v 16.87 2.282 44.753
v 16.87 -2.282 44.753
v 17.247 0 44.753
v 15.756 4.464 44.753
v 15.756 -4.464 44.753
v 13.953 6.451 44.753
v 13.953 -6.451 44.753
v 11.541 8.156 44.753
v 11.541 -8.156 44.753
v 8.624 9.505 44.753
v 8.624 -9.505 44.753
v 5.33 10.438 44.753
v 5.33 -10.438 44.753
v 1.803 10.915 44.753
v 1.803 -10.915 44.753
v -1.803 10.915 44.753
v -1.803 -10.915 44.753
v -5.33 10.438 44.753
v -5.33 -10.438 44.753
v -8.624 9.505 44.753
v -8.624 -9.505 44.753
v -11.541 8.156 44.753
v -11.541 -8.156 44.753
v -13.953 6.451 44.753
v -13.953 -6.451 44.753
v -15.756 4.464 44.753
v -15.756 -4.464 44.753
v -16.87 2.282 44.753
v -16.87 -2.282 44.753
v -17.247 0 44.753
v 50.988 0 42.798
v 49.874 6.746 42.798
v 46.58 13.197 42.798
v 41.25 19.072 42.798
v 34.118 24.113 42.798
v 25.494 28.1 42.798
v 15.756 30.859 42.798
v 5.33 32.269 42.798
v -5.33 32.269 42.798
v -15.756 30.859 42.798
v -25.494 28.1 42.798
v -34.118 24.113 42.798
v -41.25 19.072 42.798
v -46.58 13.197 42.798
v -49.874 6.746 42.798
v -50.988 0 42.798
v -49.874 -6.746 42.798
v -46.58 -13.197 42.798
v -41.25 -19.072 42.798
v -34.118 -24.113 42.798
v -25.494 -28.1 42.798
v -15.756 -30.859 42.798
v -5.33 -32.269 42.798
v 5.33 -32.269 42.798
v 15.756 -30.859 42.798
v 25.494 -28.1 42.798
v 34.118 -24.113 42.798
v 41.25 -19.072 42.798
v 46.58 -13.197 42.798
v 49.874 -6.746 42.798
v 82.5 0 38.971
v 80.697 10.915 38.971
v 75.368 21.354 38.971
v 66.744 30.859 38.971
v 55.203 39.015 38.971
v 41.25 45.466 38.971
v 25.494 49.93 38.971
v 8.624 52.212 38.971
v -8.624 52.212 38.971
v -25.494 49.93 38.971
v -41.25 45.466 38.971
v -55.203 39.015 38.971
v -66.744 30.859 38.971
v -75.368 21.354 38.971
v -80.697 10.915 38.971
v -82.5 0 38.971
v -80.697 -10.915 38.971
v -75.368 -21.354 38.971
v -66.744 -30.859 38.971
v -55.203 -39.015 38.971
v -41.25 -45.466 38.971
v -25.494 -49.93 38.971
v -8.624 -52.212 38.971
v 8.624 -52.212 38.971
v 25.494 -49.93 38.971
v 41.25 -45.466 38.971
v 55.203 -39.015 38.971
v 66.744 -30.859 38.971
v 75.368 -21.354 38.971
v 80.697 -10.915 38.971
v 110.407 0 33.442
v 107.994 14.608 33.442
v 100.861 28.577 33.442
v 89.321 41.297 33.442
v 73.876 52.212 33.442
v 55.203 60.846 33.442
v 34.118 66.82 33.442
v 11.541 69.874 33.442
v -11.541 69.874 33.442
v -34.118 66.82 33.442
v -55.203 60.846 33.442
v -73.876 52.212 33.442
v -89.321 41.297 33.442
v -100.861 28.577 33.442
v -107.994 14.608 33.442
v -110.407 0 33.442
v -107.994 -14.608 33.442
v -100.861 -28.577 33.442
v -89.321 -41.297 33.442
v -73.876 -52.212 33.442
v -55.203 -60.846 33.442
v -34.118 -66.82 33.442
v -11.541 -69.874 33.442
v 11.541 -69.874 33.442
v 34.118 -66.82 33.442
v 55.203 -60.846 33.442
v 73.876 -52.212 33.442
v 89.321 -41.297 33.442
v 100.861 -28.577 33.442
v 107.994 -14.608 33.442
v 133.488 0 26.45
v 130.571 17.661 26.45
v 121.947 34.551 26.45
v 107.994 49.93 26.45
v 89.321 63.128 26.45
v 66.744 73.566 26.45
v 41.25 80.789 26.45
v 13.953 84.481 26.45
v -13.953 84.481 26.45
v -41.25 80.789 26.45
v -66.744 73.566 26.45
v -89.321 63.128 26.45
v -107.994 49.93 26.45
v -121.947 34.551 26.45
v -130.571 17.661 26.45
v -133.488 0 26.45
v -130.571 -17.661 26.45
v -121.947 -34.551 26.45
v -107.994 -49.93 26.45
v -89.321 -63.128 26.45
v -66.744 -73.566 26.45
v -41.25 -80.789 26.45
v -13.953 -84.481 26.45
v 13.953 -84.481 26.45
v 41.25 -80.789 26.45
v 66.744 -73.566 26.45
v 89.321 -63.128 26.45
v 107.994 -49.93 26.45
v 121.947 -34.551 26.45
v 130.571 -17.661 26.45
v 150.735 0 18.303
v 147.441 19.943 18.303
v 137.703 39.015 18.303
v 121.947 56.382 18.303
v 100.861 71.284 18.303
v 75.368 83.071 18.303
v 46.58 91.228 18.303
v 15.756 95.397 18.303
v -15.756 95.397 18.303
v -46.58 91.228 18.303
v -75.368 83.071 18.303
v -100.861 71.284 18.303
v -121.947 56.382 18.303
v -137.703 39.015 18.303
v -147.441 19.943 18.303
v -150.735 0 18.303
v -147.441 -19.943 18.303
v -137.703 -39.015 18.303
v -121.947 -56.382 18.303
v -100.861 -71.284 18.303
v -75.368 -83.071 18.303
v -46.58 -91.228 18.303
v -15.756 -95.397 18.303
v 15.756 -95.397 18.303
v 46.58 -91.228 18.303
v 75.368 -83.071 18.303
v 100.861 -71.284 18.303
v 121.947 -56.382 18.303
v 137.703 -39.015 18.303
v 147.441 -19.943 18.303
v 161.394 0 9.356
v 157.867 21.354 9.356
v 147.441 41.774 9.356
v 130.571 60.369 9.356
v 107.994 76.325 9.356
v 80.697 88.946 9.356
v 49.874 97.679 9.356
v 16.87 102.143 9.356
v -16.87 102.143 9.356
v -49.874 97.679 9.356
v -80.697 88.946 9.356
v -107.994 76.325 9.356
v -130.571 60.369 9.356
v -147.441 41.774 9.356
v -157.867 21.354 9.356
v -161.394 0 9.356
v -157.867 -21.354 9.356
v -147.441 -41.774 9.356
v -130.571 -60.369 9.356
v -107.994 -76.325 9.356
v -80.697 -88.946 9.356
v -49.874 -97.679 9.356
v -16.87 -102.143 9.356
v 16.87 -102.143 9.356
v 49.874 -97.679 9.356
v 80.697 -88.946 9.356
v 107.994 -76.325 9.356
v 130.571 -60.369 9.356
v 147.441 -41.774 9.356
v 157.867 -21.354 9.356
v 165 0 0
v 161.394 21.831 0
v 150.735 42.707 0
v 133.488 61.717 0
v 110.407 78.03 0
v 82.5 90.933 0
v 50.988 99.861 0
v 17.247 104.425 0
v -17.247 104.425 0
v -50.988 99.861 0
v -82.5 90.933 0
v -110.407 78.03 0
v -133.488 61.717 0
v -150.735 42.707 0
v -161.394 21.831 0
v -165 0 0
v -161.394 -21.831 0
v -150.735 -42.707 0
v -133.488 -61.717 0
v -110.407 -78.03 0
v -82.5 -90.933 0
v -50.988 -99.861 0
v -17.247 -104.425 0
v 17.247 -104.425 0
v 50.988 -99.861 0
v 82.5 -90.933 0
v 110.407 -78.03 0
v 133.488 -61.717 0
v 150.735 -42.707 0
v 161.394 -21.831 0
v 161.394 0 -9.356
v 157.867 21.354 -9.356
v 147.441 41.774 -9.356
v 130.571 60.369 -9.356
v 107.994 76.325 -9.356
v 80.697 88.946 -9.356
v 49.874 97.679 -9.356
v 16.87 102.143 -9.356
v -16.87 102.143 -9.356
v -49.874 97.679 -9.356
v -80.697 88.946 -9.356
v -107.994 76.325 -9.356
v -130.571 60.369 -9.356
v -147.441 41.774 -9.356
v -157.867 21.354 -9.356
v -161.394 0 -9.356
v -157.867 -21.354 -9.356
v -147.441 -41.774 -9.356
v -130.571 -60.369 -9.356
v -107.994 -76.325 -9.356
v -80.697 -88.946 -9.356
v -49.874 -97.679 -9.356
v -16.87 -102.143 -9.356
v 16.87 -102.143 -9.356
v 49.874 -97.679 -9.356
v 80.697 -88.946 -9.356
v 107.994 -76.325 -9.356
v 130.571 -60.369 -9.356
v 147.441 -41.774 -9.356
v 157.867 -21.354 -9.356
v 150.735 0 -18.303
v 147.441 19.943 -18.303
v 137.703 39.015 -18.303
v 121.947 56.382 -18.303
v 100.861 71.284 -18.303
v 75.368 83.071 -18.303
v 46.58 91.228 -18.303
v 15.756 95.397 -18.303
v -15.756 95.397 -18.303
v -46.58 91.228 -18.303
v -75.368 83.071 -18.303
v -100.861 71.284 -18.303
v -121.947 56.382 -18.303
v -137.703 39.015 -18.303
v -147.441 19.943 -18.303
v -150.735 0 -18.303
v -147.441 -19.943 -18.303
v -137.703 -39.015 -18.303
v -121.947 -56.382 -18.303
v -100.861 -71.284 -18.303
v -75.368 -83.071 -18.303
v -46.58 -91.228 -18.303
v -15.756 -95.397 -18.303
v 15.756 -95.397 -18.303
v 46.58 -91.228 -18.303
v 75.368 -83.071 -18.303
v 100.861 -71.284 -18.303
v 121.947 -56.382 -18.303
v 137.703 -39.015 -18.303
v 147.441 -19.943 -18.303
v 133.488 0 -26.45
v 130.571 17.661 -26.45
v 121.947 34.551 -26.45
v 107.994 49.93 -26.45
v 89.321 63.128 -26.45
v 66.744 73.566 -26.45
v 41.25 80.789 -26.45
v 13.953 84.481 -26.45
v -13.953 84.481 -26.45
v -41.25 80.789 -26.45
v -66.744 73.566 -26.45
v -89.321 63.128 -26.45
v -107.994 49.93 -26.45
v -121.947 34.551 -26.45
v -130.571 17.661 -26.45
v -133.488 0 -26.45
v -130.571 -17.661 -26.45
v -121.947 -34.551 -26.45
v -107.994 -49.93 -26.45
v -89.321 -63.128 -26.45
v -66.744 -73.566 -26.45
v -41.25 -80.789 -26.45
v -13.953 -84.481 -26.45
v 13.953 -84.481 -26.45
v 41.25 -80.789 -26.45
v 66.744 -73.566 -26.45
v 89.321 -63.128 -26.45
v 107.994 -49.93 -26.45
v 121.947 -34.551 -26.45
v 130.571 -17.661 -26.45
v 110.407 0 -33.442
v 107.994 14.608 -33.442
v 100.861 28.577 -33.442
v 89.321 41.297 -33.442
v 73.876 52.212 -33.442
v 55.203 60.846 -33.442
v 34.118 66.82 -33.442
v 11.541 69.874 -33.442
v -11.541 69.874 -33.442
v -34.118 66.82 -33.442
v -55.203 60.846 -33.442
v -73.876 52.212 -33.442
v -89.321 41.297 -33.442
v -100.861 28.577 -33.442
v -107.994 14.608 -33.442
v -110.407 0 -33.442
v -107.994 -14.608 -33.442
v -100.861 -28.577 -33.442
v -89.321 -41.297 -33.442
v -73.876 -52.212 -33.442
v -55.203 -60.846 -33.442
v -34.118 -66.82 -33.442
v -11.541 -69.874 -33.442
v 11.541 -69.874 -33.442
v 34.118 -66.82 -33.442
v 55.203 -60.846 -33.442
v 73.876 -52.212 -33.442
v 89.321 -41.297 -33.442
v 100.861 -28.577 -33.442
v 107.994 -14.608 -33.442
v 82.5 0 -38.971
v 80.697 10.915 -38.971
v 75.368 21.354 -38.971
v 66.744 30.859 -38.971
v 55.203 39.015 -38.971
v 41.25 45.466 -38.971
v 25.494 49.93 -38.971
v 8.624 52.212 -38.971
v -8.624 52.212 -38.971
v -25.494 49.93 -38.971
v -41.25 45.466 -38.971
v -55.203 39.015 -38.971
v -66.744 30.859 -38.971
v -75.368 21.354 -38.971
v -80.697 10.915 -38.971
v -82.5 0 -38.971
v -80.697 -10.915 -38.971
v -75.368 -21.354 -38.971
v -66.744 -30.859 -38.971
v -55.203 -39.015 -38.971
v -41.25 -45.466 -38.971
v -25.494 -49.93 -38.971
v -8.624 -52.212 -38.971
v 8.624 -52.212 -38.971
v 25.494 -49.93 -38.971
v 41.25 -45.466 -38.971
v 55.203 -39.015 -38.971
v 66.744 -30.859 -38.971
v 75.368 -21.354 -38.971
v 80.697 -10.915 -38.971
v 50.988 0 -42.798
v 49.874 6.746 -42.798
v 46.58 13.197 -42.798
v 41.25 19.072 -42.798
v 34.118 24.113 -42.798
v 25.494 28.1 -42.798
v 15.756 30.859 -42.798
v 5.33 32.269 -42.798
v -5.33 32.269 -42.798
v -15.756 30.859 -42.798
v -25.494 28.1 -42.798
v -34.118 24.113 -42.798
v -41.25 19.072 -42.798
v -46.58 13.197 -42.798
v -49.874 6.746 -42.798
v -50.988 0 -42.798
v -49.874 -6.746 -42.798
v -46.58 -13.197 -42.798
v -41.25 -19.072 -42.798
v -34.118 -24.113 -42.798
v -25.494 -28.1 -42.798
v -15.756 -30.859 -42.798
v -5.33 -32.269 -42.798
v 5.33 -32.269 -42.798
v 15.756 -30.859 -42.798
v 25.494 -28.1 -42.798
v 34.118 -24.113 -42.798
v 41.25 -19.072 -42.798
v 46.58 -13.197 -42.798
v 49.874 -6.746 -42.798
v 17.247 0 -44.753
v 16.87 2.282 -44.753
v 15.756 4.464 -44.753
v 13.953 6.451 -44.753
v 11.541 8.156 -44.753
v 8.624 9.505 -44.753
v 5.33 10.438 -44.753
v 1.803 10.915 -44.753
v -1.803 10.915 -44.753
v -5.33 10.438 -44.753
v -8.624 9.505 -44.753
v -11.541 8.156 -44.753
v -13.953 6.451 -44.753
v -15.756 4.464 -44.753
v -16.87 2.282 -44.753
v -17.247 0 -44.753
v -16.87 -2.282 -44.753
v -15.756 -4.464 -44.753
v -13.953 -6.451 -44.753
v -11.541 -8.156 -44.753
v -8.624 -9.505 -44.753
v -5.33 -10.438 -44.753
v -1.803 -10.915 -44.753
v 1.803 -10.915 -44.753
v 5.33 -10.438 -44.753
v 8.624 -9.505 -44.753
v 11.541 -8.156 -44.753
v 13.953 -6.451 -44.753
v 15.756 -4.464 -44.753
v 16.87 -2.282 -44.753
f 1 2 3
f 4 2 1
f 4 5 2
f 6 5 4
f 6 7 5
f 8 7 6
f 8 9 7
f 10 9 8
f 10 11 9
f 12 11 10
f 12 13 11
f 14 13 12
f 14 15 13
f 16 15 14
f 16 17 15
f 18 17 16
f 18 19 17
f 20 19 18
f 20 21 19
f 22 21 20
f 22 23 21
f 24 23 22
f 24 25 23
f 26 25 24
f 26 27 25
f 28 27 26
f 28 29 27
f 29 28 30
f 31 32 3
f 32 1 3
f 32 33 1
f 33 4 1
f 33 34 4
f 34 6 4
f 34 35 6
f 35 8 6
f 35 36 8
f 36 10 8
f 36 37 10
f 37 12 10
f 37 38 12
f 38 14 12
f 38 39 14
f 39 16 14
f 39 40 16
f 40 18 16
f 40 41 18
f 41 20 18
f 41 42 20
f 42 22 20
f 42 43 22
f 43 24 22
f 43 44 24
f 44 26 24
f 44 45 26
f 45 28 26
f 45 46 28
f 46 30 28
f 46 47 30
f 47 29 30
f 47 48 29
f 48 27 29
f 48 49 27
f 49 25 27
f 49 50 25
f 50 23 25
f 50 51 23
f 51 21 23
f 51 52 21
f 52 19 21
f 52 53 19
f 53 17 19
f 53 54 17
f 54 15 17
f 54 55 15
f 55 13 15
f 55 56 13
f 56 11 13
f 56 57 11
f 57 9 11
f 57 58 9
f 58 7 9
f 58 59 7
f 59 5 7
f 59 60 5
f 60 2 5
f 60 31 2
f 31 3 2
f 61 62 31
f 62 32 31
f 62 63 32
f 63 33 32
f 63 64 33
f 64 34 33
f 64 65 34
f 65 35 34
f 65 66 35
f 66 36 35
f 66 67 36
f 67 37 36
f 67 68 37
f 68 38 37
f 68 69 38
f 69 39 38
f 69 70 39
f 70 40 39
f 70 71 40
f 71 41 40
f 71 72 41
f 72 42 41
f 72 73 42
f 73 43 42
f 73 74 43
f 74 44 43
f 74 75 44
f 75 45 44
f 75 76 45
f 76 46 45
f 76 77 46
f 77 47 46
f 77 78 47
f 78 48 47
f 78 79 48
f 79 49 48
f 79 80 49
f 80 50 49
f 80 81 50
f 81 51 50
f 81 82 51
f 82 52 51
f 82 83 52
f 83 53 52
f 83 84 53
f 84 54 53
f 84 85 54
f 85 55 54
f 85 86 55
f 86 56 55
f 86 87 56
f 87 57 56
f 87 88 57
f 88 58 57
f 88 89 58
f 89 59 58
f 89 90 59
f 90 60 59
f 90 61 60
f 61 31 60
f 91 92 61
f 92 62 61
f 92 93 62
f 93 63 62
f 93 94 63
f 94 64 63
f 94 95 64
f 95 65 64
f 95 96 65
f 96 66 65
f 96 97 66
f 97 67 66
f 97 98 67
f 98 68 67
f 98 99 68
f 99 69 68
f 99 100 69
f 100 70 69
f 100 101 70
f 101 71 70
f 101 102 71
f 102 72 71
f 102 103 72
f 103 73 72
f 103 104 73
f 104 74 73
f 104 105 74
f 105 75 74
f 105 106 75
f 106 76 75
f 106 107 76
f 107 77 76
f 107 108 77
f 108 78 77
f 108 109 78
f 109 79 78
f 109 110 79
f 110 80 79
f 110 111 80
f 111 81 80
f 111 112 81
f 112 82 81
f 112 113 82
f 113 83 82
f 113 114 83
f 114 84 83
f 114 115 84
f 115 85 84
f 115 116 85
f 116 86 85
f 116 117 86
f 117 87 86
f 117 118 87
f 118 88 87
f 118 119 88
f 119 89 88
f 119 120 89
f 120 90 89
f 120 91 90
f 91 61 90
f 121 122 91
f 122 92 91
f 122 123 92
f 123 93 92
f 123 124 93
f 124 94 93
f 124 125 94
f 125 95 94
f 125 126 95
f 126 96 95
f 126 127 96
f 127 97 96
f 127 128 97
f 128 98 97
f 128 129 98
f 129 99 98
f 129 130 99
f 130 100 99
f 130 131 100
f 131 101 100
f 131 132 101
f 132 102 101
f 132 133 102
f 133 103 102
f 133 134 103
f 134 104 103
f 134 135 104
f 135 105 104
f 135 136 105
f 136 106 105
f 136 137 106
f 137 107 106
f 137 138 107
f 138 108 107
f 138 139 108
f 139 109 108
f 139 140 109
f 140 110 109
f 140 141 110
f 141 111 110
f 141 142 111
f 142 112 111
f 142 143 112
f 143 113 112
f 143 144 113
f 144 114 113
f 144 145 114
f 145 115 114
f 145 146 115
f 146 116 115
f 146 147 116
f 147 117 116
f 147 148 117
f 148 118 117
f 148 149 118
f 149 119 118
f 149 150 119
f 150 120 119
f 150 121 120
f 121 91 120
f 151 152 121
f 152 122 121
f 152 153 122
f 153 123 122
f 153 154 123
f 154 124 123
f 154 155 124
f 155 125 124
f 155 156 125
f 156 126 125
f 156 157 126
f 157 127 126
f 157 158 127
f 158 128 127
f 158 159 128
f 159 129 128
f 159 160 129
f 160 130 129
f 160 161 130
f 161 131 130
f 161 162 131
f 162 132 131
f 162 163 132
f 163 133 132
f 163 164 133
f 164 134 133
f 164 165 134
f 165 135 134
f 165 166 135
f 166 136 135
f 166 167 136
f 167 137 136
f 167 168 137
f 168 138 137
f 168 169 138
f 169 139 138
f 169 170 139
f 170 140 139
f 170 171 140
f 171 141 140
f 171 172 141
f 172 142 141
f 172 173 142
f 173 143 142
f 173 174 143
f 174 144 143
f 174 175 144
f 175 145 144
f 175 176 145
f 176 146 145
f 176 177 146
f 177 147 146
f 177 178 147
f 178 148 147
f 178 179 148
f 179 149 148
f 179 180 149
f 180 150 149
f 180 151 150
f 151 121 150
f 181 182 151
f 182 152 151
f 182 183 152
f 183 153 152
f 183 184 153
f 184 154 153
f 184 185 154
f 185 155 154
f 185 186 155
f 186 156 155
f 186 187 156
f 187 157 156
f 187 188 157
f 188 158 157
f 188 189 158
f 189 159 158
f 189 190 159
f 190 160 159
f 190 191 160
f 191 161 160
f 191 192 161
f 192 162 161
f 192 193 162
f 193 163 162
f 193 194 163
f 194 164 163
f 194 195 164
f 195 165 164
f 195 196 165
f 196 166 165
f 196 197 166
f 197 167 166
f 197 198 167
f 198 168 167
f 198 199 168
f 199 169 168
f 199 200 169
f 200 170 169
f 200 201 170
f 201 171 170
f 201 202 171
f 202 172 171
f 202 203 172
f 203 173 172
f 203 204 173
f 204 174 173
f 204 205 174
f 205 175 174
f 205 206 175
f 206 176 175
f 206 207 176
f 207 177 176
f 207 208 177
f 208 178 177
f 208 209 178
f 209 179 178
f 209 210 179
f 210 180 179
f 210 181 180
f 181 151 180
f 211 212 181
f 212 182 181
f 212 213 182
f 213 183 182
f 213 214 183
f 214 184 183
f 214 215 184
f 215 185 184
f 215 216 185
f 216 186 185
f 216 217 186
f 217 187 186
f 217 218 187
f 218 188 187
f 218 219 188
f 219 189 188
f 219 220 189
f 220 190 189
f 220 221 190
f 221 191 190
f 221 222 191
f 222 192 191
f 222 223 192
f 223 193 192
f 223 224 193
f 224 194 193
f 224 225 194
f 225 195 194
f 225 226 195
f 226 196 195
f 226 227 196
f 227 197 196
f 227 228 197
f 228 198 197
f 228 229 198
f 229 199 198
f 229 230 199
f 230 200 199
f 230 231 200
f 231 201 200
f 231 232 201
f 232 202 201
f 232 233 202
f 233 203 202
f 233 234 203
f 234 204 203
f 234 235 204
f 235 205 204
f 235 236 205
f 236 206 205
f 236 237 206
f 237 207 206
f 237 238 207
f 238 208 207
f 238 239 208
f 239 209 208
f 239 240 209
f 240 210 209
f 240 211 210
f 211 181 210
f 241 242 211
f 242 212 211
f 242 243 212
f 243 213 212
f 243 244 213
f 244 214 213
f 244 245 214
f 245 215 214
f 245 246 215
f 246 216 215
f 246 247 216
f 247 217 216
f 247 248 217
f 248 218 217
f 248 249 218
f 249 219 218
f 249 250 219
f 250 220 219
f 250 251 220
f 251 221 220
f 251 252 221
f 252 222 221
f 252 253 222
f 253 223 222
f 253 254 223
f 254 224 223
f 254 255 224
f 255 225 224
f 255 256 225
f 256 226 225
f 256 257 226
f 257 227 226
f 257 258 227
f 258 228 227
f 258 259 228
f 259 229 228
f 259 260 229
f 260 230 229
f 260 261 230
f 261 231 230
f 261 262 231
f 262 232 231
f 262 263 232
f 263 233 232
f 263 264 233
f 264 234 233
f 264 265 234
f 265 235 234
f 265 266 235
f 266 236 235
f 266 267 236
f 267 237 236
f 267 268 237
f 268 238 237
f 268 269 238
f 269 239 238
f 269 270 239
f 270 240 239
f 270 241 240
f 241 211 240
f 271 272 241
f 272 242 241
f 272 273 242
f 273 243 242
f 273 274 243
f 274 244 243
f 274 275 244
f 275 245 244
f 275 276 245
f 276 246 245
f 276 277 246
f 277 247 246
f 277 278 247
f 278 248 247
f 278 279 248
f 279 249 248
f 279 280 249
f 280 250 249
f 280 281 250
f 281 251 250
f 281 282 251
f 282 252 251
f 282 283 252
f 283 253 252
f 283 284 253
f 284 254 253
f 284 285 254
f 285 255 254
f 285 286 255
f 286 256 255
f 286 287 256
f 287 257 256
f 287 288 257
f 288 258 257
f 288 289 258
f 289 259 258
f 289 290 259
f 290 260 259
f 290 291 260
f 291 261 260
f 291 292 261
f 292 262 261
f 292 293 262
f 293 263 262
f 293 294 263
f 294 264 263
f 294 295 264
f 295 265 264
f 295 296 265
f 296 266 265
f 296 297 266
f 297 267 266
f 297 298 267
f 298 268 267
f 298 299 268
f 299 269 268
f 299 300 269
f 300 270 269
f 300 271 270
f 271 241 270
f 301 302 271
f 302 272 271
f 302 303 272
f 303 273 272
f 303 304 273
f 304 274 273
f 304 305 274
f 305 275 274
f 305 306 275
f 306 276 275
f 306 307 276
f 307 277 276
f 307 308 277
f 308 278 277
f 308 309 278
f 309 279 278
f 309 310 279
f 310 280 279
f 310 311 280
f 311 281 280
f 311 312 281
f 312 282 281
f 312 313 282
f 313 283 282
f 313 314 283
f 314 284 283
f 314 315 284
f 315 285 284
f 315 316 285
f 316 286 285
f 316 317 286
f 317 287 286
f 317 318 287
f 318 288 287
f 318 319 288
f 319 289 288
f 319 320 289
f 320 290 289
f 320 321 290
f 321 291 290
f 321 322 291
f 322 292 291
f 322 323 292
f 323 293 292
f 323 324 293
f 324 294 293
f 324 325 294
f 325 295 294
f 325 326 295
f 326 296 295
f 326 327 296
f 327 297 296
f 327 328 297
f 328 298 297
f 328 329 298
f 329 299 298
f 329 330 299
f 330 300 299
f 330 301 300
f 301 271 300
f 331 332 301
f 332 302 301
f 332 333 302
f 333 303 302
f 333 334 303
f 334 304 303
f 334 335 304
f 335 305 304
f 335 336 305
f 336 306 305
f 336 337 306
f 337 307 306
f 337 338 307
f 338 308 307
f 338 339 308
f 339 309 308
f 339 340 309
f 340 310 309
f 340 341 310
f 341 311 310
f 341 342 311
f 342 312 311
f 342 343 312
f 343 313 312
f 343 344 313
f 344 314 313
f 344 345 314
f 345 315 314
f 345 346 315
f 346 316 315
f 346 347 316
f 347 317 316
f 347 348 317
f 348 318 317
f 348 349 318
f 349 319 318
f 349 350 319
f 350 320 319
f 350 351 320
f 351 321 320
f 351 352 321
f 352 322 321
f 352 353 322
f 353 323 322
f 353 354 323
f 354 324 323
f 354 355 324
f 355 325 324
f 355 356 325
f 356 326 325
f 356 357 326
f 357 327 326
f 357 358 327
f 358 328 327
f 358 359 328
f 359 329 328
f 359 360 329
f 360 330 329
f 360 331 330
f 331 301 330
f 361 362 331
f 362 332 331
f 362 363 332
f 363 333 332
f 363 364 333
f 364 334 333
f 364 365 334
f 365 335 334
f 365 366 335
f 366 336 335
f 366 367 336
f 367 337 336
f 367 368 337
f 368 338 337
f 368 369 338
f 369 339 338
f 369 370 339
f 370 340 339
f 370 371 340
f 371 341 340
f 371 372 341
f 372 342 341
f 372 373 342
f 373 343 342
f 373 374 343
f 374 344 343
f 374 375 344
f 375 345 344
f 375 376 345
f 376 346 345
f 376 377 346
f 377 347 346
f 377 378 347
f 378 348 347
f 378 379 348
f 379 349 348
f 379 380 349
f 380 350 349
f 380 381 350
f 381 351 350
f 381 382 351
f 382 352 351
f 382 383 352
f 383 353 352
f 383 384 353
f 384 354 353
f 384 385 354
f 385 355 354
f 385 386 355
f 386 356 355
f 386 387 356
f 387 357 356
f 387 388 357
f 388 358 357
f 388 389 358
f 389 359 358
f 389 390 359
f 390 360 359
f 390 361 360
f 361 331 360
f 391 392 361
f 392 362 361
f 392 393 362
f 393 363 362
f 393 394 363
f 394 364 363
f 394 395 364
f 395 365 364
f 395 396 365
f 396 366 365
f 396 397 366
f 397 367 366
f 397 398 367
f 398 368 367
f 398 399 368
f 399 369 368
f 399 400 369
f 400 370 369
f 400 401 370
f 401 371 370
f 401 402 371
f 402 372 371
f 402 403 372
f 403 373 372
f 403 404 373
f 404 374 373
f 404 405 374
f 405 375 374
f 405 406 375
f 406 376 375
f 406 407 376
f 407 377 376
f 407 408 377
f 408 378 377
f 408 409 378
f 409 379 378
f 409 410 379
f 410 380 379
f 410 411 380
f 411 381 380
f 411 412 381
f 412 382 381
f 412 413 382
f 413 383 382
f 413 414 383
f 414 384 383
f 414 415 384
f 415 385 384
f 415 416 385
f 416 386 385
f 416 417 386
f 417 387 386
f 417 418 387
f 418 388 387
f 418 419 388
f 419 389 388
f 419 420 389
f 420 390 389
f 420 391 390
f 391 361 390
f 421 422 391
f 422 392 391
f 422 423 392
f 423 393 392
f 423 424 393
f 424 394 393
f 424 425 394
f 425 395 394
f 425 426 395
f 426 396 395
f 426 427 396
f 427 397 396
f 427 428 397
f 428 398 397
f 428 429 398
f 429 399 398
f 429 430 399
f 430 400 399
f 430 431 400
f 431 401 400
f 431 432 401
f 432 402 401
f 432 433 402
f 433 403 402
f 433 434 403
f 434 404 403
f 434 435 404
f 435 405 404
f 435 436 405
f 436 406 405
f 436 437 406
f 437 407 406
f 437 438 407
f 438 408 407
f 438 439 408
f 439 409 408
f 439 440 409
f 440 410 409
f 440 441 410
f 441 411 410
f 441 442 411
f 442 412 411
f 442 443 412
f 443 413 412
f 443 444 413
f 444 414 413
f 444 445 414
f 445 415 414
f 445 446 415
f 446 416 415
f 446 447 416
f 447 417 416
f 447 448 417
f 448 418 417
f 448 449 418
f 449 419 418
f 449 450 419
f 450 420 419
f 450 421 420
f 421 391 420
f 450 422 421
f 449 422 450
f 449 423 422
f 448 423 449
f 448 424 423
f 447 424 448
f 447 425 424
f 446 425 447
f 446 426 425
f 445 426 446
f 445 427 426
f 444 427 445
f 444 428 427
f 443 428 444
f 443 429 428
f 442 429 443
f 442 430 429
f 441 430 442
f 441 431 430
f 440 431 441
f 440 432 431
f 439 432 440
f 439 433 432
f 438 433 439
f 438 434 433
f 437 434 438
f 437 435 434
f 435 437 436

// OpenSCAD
// Generated by SolidPython 1.0.1 on 2020-07-29 00:46:49


scale(v = [11, 7, 3]) {
	sphere(r = 15);
}
/***********************************************
*********      SolidPython code:      **********
************************************************
 
# import packages: SolidPython
from solid import *
from solid.utils import *
from itertools import chain, combinations, permutations


class Resize:

    def __init__(self, scad_file):
        self.scad_file = scad_file
        #self.scad_file = import_scad(scad_file)
        # cone/cylinder param:
        self.r1 = 0
        self.r2 = 0
        self.h = 0
        # rectangular prism param:
        self.w = 0
        self.l = 0
        # ellipse param:
        self.r = 0

    # import OpenScad code (file name corresponds to shape)


    # classify shape + parameters
    def assign(self, param1, param2, param3):
        if self.scad_file == 'cone.scad':
            self.r1 = param1
            self.r2 = param2
            self.h = param3
        elif self.scad_file == 'cylinder.scad':
            self.r1 = param1
            self.r2 = param2
            self.h = param3
        elif self.scad_file == 'rectangularPrism.scad':
            self.h = param1
            self.l = param2
            self.w = param3
        else:
            self.r = param1
            self.h = param2

    # resize parameters
    def iterate(self):
        x = range(3, 20, 2)
        i = 1
        if self.scad_file == 'cone.scad':
            tempList = list(permutations(x, 2))
            for temp in tempList:
                param1 = temp[0]
                param2 = temp[1]
                filepath = 'produced_scad_files/' + 'cone' + str(param1) + '_' + str(param2) + '_' + '.scad'
                scad_render_to_file(cylinder(h=param1, r1=param2, r2=0), filepath)

        elif self.scad_file == 'cylinder.scad':
            tempList = list(permutations(x, 3))
            for temp in tempList:
                param1 = temp[0]
                param2 = temp[1]
                filepath = 'produced_scad_files/' + 'cylinder' + str(param1) + '_' + str(param2) + '_' + '.scad'
                scad_render_to_file(cylinder(h=param1, r1=param2, r2=param2), filepath)

        elif self.scad_file == 'rectangularPrism.scad':
            tempList = list(permutations(x, 3))
            for temp in tempList:
                param1 = temp[0]
                param2 = temp[1]
                param3 = temp[2]
                filepath = 'produced_scad_files/' + 'rectangularPrism' + str(param1) + '_' + str(param2) + '_' + str(
                    param3) + '.scad'
                scad_render_to_file(cube(size=(param1, param2, param3)), filepath)

        elif self.scad_file == 'ellipse.scad':
            tempList = list(permutations(x, 4))
            for temp in tempList:
                param1 = temp[0]
                param2 = temp[1]
                param3 = temp[2]
                param4 = temp[3]
                filepath = 'produced_scad_files/' + 'ellipse' + str(param1) + '_' + str(param2) + '_' + str(param3) + '_' + str(param4) + '.scad'
                scad_render_to_file(scale([param1, param2, param3])(sphere(r=param4)), filepath)

    def render_to_scadfile(self):
        scad_render_to_file(scad, 'example.scad') 
 
************************************************/
